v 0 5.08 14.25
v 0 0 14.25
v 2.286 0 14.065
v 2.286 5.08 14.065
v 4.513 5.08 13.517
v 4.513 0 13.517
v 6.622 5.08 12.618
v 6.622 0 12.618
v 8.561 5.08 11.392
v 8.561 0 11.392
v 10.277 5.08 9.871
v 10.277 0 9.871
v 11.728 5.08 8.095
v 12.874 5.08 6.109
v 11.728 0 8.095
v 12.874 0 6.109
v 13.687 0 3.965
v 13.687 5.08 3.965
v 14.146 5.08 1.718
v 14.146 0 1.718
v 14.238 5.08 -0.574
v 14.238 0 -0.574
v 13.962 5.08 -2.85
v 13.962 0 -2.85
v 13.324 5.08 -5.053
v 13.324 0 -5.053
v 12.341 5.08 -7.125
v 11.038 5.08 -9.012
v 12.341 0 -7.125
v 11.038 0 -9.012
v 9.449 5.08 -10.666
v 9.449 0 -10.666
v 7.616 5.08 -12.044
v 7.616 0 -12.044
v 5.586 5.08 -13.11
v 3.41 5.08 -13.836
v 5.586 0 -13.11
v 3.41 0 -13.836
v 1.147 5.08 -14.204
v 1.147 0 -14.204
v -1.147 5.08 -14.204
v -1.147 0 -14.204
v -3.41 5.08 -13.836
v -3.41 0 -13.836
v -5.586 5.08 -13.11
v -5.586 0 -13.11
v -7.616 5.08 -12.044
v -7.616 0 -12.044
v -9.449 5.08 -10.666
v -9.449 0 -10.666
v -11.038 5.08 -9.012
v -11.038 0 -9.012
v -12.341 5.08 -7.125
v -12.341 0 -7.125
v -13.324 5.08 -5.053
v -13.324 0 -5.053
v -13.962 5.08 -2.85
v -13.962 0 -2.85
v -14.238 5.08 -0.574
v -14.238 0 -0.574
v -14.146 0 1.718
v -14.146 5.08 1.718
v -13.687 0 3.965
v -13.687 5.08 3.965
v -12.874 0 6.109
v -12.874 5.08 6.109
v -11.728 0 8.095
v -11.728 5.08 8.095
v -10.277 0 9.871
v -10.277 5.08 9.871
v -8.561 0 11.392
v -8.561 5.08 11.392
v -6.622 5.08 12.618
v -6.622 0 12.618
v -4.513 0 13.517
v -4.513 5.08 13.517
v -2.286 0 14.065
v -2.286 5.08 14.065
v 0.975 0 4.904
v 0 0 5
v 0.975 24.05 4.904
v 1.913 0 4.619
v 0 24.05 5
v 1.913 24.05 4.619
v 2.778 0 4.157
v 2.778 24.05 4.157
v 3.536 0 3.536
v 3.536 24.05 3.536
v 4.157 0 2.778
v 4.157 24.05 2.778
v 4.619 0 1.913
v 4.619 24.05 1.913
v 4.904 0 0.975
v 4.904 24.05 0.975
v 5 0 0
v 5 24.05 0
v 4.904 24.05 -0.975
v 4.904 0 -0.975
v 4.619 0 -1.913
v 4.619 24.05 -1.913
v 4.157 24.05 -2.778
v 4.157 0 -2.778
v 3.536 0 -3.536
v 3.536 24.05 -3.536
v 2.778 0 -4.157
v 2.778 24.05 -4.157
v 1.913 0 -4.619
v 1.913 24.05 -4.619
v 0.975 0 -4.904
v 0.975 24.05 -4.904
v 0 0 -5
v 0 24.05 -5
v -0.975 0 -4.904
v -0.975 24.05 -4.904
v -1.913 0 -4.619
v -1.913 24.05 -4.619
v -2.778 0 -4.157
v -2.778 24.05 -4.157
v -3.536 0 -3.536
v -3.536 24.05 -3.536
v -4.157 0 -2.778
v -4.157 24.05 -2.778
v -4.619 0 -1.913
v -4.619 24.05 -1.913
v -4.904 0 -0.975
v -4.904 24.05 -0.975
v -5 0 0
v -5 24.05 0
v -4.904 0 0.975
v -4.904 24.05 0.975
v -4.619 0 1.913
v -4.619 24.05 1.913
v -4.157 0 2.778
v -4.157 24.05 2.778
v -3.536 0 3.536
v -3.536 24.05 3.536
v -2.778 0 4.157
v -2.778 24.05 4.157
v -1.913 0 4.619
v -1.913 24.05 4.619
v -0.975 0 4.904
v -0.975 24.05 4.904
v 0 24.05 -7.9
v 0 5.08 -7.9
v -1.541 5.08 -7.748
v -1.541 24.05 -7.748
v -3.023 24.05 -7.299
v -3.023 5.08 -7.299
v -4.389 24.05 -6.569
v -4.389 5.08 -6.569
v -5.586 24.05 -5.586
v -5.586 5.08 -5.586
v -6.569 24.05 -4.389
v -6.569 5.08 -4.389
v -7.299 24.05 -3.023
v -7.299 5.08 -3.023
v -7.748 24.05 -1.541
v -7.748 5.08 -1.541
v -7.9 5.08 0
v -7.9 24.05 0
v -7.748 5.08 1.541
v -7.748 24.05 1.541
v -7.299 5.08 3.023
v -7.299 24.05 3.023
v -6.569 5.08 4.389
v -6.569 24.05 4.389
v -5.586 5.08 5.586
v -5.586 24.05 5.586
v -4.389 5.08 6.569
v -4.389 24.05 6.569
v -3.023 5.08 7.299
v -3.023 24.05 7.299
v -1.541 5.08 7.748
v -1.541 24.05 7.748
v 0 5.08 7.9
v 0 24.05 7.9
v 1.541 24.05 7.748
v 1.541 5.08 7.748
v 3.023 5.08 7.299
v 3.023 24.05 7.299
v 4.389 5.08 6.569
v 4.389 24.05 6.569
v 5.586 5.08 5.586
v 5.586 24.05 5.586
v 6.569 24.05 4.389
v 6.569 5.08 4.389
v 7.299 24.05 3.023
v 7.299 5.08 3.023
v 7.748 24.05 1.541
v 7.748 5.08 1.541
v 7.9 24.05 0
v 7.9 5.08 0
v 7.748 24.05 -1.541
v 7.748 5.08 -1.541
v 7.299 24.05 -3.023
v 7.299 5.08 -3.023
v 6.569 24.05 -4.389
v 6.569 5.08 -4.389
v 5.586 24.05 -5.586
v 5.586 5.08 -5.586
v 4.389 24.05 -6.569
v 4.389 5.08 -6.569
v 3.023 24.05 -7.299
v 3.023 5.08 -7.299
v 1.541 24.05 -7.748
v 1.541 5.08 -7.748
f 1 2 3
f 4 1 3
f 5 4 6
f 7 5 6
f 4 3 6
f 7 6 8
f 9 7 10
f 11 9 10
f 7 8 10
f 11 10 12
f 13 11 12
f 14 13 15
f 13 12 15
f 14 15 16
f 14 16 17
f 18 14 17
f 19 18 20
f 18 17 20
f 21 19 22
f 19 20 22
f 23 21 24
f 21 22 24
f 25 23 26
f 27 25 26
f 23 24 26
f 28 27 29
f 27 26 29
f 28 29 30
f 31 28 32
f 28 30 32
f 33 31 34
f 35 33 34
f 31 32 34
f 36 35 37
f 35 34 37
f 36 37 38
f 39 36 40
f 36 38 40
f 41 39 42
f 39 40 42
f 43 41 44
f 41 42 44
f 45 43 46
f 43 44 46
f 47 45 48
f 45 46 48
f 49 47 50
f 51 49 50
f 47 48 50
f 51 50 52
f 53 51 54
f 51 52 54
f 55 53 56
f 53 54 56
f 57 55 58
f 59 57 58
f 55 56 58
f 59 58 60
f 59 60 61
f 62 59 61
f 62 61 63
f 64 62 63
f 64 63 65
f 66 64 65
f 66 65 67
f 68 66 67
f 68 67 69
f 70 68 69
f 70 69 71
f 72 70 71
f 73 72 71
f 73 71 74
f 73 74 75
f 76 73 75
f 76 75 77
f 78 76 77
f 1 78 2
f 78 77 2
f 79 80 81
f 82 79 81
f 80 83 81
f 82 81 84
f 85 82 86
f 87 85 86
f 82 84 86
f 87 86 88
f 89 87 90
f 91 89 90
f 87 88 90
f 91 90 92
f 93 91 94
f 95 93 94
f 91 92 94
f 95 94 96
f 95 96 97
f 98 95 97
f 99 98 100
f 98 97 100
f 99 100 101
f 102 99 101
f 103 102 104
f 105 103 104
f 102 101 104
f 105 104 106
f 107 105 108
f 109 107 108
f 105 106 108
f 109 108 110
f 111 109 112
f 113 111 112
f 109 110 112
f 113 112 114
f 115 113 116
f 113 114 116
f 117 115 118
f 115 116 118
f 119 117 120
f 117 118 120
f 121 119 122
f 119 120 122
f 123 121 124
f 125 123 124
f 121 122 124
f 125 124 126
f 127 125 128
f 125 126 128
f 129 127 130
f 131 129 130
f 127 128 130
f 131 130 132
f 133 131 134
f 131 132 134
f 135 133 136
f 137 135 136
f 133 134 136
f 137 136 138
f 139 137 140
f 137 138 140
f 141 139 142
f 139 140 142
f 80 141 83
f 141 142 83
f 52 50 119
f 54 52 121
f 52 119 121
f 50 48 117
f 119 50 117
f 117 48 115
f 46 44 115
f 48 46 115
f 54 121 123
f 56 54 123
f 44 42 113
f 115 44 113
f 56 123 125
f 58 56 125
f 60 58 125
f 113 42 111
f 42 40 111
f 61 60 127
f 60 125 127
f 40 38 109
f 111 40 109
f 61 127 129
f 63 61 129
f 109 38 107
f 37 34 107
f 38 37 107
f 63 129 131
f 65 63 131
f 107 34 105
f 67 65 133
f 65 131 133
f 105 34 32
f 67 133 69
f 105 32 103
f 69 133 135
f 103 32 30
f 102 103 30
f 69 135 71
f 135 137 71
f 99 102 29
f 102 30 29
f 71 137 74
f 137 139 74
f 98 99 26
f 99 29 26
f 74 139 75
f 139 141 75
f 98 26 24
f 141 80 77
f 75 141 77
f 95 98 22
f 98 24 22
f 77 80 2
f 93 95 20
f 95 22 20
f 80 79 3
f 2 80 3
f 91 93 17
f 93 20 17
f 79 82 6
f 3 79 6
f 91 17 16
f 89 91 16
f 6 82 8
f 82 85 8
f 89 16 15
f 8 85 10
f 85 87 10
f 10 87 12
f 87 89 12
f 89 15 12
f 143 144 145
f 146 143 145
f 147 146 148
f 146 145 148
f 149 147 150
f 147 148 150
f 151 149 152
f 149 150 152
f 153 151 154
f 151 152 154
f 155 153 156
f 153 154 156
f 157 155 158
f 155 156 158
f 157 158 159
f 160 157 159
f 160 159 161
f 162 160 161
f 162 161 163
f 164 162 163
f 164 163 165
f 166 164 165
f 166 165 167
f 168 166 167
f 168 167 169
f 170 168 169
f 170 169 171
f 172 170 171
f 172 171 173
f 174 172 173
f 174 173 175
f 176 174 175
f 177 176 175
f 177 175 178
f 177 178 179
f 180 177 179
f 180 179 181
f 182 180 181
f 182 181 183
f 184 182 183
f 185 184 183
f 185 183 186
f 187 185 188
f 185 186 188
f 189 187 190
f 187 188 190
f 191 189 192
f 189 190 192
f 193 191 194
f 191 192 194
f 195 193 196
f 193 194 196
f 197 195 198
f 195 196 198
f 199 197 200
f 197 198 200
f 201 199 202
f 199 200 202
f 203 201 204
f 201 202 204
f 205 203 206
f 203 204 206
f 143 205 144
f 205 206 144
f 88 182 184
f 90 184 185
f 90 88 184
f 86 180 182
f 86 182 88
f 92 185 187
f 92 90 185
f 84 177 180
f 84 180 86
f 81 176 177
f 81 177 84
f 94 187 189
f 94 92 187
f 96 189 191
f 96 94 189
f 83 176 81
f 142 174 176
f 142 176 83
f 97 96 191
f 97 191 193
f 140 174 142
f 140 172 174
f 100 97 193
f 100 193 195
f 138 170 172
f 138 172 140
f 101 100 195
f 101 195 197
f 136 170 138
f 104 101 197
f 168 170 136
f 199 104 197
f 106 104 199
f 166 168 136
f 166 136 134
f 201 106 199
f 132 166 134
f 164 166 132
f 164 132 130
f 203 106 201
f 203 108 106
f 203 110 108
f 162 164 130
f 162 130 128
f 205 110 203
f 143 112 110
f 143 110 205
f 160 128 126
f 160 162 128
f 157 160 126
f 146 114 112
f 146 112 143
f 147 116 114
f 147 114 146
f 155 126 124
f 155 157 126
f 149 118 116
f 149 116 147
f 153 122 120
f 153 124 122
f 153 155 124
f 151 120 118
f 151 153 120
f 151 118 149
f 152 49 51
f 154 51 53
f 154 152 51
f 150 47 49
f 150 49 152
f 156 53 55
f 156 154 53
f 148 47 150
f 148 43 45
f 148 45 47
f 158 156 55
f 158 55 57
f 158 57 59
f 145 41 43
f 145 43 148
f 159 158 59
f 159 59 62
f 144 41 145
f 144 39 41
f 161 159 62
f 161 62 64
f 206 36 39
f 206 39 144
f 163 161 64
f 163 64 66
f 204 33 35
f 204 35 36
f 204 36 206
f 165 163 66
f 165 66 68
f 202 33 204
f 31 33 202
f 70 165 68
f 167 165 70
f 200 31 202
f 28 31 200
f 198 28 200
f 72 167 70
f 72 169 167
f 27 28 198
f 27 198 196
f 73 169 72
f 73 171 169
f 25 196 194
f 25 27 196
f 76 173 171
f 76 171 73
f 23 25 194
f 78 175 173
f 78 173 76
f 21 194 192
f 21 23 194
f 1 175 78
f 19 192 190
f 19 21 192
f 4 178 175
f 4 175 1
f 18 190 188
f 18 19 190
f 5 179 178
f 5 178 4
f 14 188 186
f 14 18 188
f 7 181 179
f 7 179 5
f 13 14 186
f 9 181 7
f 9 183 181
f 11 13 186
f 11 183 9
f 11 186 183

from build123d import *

# Parameters (mm, degrees)
SKETCH1_R        = 7.9
EXTRUSION2_DEPTH = 19.05
EXTRUSION3_REACH = 24.084
SKETCH2_R        = 5
SKETCH3_R        = 14.25
EXTRUSION4_DEPTH = 5.08
EXTRUSION5_REACH = 29.676
SKETCH4_R        = 5


with BuildPart() as part:
    # Sketch1 → Extrusion2 (new body)
    with BuildSketch(Plane(origin=(0, 5, 0), x_dir=(1, 0, 0), z_dir=(0, 1, 0))):
        with Locations(Location((0, 0, 0), (0, 0, 90))):
            Circle(SKETCH1_R)
    extrude(amount=EXTRUSION2_DEPTH)

    # Sketch2 → Extrusion3 (cut, up to next)
    with BuildSketch(Plane(origin=(0, 24.05, 0), x_dir=(-1, 0, 0), z_dir=(0, 1, 0)), mode=Mode.PRIVATE) as extrusion3_sk1:
        with Locations(Location((0, 0, 0), (0, 0, 90))):
            Circle(SKETCH2_R)
    extrusion3_tool1 = extrude(extrusion3_sk1.sketch, amount=-EXTRUSION3_REACH, mode=Mode.PRIVATE) & part.part
    add(extrusion3_tool1.solids().sort_by_distance((0, 24.05, 0))[0], mode=Mode.SUBTRACT)

    # Sketch3 → Extrusion4 (add)
    with BuildSketch(Plane(origin=(0, 0, 0), x_dir=(-1, 0, 0), z_dir=(0, 1, 0))):
        with Locations(Location((0, 0, 0), (0, 0, 90))):
            Circle(SKETCH3_R)
    extrude(amount=EXTRUSION4_DEPTH)

    # Sketch4 → Extrusion5 (cut, up to next)
    with BuildSketch(Plane(origin=(0, 5.08, 0), x_dir=(-1, 0, 0), z_dir=(0, 1, 0)), mode=Mode.PRIVATE) as extrusion5_sk1:
        with Locations(Location((0, 0, 0), (0, 0, 90))):
            Circle(SKETCH4_R)
    extrusion5_tool1 = extrude(extrusion5_sk1.sketch, amount=-EXTRUSION5_REACH, mode=Mode.PRIVATE) & part.part
    add(extrusion5_tool1.solids().sort_by_distance((0, 5.08, 0))[0], mode=Mode.SUBTRACT)


solid = part.part
